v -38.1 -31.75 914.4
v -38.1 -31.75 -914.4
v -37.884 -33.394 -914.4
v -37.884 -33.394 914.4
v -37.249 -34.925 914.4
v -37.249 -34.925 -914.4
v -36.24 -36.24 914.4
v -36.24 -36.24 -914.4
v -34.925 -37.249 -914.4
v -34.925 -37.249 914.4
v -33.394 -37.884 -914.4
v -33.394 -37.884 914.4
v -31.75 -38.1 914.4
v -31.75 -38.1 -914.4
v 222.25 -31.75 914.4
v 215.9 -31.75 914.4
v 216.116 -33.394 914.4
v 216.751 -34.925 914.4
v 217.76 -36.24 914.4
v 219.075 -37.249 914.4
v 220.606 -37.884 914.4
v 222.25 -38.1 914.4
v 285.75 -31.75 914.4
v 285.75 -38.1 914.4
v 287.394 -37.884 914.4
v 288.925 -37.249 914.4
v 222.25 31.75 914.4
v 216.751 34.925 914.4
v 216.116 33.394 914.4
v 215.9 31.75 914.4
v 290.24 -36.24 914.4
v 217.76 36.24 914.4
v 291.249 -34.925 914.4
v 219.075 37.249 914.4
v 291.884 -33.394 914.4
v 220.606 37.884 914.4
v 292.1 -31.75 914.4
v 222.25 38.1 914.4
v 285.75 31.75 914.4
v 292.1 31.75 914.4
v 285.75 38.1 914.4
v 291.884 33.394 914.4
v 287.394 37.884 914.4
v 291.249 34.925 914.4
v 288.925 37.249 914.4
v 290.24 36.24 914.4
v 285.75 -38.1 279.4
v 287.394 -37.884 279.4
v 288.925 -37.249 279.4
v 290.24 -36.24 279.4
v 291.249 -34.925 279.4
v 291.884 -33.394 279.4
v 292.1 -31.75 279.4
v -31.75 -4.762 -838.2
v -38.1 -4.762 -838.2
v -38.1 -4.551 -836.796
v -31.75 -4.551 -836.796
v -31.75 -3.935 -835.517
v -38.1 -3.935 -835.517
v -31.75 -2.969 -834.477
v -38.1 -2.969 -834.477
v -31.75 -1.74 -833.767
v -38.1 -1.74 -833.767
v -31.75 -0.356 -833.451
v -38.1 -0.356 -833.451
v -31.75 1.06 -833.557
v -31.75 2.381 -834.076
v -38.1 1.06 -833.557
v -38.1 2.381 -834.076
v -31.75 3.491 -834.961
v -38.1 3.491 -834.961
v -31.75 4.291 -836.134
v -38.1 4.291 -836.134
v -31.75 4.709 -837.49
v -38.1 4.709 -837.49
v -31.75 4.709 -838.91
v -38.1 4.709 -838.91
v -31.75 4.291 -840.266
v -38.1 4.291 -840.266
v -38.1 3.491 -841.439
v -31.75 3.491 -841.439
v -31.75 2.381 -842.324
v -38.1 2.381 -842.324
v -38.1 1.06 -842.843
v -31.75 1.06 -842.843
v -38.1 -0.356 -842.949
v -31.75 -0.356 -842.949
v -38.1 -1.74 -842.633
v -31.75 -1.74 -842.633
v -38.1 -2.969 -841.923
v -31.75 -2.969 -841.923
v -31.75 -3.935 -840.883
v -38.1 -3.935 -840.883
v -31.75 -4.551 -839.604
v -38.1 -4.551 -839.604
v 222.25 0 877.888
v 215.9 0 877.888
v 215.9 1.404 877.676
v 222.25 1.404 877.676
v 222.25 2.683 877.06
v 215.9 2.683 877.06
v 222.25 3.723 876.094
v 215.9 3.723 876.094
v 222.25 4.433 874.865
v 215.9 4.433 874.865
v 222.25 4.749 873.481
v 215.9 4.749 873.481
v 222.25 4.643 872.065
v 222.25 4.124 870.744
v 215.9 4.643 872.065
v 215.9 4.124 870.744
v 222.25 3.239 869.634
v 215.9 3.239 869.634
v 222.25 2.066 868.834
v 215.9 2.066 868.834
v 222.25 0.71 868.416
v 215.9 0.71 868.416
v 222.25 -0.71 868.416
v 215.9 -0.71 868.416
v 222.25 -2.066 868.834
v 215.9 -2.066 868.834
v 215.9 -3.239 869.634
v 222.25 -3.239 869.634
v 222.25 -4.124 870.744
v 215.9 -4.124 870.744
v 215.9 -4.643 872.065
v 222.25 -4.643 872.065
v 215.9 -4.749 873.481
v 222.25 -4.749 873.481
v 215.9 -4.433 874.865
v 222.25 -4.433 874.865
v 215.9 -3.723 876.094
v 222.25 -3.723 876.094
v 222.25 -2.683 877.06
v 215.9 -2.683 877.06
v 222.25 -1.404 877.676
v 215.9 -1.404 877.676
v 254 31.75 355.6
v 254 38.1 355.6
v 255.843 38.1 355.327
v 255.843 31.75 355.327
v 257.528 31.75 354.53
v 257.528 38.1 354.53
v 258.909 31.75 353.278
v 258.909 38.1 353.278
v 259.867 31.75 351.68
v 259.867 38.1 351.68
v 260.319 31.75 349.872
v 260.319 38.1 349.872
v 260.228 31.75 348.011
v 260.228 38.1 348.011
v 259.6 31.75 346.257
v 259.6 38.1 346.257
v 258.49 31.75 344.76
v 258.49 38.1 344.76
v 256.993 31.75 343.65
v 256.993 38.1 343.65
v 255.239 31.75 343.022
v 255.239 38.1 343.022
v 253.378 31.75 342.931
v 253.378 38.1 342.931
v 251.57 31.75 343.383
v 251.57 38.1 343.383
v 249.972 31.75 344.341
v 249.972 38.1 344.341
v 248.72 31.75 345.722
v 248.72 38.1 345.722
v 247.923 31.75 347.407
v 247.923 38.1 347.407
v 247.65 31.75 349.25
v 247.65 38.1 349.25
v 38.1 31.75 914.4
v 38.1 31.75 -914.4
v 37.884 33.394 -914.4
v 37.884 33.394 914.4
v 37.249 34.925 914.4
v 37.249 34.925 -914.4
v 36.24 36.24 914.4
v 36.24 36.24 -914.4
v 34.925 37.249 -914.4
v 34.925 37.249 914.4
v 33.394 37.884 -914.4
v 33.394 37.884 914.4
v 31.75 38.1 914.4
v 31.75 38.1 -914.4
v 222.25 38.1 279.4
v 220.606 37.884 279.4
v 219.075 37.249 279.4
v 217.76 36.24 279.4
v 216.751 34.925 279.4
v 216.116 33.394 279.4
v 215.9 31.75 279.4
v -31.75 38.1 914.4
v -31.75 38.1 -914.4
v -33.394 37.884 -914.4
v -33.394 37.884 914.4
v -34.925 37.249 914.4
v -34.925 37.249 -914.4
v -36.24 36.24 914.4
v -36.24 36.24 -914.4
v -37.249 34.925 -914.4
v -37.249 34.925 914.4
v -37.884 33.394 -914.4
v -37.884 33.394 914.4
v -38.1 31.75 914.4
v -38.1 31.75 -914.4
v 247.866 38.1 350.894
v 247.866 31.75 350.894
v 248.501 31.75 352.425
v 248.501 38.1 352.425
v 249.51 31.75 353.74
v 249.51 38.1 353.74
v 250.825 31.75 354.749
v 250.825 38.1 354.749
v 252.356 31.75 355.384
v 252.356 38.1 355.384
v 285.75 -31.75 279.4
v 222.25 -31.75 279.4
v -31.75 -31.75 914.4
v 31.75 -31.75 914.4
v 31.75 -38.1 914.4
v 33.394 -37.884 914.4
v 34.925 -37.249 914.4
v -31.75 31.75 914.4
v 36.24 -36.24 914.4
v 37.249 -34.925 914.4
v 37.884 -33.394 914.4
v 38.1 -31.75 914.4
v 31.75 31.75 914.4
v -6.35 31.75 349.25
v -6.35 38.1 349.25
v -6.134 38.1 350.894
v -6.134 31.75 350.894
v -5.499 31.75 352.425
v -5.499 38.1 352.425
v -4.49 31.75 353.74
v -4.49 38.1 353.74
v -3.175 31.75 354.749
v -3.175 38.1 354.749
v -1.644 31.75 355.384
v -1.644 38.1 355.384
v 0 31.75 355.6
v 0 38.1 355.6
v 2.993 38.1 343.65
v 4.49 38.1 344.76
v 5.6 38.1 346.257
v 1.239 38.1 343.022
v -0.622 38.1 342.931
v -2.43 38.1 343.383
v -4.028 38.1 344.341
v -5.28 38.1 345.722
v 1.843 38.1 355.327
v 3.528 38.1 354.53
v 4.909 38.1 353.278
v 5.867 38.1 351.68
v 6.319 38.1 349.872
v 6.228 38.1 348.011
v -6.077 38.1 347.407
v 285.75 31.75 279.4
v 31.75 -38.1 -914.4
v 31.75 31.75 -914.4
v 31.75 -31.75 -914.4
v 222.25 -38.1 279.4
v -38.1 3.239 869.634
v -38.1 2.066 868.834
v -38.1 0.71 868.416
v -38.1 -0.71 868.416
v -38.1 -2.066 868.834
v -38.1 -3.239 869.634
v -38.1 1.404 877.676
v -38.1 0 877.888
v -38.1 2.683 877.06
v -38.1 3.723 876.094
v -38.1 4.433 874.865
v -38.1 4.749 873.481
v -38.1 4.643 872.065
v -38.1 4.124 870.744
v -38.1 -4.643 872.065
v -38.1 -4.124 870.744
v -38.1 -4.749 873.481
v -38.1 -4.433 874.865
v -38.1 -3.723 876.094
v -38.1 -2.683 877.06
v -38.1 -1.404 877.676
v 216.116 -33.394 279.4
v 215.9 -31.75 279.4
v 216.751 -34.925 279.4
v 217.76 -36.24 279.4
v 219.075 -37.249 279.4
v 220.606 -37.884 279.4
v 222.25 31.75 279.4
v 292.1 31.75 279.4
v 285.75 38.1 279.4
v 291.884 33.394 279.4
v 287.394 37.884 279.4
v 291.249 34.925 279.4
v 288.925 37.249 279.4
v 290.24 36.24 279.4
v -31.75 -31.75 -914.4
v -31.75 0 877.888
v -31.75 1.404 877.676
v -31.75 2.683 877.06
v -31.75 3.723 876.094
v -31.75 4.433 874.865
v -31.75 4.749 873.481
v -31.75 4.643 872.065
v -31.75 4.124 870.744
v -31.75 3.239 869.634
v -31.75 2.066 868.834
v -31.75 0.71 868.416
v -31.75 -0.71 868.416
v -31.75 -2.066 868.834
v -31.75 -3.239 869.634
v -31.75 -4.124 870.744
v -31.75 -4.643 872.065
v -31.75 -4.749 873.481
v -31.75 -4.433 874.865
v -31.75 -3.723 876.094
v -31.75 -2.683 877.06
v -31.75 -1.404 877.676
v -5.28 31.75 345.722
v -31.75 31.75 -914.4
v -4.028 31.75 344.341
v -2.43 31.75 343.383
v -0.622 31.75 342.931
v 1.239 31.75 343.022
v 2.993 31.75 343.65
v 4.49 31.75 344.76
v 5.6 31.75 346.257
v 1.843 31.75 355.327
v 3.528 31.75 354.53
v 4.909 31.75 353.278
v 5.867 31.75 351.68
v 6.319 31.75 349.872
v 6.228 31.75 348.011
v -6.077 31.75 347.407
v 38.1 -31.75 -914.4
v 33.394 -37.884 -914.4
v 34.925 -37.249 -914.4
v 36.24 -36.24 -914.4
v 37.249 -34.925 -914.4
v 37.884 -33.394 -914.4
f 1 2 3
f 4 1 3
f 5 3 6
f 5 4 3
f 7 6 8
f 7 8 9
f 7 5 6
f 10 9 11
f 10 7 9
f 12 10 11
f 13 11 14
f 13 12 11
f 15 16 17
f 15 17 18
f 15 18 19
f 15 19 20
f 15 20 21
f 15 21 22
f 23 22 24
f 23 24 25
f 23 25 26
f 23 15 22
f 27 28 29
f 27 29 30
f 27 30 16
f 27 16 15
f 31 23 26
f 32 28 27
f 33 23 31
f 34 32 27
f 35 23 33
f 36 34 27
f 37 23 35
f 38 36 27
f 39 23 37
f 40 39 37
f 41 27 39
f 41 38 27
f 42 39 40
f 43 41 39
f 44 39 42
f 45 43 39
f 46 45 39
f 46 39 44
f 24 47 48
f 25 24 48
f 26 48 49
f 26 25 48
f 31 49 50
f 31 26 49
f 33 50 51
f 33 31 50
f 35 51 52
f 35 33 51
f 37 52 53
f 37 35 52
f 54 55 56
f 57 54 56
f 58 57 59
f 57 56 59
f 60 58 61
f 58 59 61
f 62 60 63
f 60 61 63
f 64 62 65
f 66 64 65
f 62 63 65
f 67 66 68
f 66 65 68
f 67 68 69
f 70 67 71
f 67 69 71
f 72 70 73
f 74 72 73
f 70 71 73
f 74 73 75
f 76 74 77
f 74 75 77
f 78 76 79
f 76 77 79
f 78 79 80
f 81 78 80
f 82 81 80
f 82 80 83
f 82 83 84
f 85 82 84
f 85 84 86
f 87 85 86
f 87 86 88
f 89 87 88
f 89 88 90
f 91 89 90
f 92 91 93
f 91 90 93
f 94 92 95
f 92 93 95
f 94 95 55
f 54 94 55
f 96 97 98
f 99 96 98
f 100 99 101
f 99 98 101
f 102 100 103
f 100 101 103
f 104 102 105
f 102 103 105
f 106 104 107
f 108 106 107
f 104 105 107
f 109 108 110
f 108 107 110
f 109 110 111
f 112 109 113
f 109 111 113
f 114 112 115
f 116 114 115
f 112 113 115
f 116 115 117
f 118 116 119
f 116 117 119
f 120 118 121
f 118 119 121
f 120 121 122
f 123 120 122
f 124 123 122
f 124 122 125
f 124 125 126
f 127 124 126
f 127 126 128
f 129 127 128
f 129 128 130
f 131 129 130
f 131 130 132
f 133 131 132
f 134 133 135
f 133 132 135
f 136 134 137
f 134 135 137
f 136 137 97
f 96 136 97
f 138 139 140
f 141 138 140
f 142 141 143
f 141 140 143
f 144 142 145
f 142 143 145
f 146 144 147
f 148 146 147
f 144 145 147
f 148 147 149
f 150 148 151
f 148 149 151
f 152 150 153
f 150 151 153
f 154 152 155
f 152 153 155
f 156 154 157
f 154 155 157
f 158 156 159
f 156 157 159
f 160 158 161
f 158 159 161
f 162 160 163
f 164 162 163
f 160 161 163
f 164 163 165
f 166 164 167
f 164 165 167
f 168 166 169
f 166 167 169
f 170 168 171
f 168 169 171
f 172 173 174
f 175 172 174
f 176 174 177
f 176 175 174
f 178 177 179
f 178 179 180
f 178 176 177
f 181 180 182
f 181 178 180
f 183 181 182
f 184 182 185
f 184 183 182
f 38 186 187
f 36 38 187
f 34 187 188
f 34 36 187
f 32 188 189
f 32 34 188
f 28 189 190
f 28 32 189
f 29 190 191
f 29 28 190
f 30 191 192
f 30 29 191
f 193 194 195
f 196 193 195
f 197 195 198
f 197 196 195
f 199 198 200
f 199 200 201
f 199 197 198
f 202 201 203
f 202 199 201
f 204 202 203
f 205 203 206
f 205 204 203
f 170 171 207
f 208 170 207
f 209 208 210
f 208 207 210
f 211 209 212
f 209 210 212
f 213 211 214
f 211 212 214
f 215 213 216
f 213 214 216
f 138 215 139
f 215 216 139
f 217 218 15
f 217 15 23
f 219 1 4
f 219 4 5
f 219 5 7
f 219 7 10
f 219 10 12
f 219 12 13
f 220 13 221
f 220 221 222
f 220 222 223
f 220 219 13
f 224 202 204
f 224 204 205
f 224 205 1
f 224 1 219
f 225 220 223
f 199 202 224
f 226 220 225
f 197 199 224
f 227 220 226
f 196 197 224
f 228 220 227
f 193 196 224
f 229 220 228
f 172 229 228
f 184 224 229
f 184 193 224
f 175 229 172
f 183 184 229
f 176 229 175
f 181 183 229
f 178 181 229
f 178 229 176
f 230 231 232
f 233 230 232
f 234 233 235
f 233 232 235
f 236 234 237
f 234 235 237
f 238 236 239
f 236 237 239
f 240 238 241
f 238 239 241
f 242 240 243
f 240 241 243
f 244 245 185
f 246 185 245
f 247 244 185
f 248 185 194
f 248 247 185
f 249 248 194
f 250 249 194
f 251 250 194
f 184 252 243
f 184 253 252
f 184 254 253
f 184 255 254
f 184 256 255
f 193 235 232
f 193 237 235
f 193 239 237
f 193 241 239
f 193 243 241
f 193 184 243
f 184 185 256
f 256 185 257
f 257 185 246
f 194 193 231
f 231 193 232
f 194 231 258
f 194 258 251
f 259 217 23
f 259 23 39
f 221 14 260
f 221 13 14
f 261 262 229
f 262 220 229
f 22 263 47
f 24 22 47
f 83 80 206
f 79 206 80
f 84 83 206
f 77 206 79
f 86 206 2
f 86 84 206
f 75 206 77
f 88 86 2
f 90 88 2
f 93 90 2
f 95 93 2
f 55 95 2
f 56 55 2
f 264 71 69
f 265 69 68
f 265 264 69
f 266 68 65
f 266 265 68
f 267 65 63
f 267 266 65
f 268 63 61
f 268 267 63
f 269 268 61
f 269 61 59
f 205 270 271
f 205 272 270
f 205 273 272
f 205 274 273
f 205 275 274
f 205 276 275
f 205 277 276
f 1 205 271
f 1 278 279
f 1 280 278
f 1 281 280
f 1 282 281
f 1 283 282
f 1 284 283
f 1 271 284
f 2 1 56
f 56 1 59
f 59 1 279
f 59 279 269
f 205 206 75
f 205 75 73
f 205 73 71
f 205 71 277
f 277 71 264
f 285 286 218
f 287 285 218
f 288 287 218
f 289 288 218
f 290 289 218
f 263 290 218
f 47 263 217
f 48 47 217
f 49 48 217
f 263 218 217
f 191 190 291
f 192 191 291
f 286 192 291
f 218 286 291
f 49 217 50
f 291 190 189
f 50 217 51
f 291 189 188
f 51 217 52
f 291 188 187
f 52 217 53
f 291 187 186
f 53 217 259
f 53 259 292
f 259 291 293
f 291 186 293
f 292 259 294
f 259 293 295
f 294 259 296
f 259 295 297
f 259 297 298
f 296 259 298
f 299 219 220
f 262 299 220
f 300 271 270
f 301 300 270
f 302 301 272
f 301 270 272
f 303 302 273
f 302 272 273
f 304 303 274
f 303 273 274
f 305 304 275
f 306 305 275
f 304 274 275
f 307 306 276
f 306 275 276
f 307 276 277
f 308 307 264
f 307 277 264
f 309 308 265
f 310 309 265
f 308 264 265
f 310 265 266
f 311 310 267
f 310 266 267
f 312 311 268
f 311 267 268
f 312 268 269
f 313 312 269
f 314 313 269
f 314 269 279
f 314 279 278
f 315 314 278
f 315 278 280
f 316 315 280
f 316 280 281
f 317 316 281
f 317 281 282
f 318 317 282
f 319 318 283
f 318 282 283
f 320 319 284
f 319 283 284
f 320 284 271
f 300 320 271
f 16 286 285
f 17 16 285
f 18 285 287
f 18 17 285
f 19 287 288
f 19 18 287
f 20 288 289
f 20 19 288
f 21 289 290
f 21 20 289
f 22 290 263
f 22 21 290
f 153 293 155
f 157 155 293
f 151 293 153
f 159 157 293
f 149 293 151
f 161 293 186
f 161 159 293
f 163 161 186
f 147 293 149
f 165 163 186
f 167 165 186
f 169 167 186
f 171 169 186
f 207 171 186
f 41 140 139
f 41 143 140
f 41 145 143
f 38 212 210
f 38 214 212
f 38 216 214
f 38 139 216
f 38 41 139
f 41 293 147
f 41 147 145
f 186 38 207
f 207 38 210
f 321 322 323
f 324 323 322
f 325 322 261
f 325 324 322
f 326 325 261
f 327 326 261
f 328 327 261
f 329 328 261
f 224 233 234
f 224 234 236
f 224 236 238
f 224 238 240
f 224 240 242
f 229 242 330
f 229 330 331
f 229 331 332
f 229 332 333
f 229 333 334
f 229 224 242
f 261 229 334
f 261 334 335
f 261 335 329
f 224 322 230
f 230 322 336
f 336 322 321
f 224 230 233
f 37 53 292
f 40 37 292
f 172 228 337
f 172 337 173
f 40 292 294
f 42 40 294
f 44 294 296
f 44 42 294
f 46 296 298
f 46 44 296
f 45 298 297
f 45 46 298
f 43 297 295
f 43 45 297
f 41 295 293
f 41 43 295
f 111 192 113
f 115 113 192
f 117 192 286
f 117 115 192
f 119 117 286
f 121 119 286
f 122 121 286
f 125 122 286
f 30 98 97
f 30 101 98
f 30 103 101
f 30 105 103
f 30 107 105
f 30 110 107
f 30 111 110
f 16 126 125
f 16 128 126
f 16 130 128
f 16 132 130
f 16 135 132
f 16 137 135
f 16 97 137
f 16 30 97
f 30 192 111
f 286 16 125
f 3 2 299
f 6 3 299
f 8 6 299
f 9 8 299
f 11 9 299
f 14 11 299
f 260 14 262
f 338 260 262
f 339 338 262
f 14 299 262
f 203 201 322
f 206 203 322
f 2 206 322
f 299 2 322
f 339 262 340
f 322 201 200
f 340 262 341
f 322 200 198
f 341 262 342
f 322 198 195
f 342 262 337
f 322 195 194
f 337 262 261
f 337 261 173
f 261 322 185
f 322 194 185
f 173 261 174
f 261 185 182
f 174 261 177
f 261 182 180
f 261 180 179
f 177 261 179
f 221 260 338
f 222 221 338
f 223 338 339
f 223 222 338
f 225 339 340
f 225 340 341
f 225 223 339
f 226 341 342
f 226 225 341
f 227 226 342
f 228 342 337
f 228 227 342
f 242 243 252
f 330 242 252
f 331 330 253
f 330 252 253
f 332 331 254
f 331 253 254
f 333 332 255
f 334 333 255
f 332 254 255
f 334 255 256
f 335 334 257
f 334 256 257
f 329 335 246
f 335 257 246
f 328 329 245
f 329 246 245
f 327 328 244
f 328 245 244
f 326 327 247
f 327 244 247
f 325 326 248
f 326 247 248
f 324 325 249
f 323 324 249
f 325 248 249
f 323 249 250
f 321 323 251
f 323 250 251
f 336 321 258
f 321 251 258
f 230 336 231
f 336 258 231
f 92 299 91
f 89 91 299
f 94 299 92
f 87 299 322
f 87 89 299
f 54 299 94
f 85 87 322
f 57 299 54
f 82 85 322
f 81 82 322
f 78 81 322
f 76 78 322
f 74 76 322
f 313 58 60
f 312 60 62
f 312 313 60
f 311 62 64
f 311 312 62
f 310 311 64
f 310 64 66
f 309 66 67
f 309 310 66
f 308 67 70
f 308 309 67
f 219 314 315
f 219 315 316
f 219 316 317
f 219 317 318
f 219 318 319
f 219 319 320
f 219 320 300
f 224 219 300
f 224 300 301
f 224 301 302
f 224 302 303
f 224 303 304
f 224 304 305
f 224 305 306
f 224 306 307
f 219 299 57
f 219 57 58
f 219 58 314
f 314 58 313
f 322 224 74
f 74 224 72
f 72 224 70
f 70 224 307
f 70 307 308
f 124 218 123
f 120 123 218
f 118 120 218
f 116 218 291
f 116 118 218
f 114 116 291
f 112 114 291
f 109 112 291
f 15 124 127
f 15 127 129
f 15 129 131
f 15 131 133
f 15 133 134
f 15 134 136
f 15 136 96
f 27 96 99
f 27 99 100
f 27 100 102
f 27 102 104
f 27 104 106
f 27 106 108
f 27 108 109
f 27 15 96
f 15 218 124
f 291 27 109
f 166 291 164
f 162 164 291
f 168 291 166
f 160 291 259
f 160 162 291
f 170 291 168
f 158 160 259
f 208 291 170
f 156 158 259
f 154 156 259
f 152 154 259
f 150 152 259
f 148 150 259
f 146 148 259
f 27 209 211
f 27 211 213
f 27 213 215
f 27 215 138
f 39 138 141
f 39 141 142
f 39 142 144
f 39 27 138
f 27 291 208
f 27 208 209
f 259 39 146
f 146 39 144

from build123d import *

# Parameters (mm, degrees)
F0_W     = 63.5
F0_H     = 63.5
F1_DEPTH = 914.4
F3_DEPTH = 6.35
F5_DEPTH = 6.35
F7_DEPTH = 6.35
F9_DEPTH = 1193.8


with BuildPart() as f1:
    # F0 (on Top) → F1 (new body, symmetric)
    with BuildSketch(Plane.XY):
        with BuildLine():
            Line((-31.75, -38.1), (31.75, -38.1))
            ThreePointArc((31.75, -38.1), (36.2401280605, -36.2401280605), (38.1, -31.75))
            Line((38.1, -31.75), (38.1, 31.75))
            ThreePointArc((38.1, 31.75), (36.2401280605, 36.2401280605), (31.75, 38.1))
            Line((31.75, 38.1), (-31.75, 38.1))
            ThreePointArc((-31.75, 38.1), (-36.2401280605, 36.2401280605), (-38.1, 31.75))
            Line((-38.1, 31.75), (-38.1, -31.75))
            ThreePointArc((-38.1, -31.75), (-36.2401280605, -36.2401280605), (-31.75, -38.1))
        make_face()
        Rectangle(F0_W, F0_H, mode=Mode.SUBTRACT)
    extrude(amount=F1_DEPTH, both=True)

    # F2 (on face) → F3 (cut, through all)
    with BuildSketch(Plane(origin=(0, 38.1, 0), x_dir=(-1, 0, 0), z_dir=(0, 1, 0))):
        with BuildLine():
            ThreePointArc((0, 355.6), (-4.4901280605, 344.7598719395), (6.35, 349.25))
            ThreePointArc((6.35, 349.25), (4.4901280605, 353.7401280605), (0, 355.6))
        make_face()
    extrude(amount=-F3_DEPTH, mode=Mode.SUBTRACT)

    # F4 (on face) → F5 (cut, through all)
    with BuildSketch(Plane(origin=(-38.1, 0, 0), x_dir=(0, -1, 0), z_dir=(-1, 0, 0))):
        with BuildLine():
            ThreePointArc((0, -842.9625), (3.3675960454, -841.5675960454), (4.7625, -838.2))
            ThreePointArc((4.7625, -838.2), (-3.3675960454, -834.8324039546), (0, -842.9625))
        make_face()
    extrude(amount=-F5_DEPTH, mode=Mode.SUBTRACT)

    # F6 (on face) → F7 (cut, through all)
    with BuildSketch(Plane(origin=(-38.1, 0, 0), x_dir=(0, -1, 0), z_dir=(-1, 0, 0))):
        with BuildLine():
            ThreePointArc((4.7625, 873.125), (3.3675960454, 876.4925960454), (0, 877.8875))
            ThreePointArc((0, 877.8875), (-3.3675960454, 869.7574039546), (4.7625, 873.125))
        make_face()
    extrude(amount=-F7_DEPTH, mode=Mode.SUBTRACT)


with BuildPart() as f8_1:
    # F8: copy of F1
    add(f1.part.moved(Location((254, 0, 0))))

    # F9 (cut): a face of the model
    f9_faces = [f8_1.faces().sort_by_distance(p)[0] for p in [
        (254, -37.0223692655, -914.4),
    ]]
    extrude(f9_faces, amount=-F9_DEPTH, mode=Mode.SUBTRACT)


solid = Compound([f1.part, f8_1.part])
